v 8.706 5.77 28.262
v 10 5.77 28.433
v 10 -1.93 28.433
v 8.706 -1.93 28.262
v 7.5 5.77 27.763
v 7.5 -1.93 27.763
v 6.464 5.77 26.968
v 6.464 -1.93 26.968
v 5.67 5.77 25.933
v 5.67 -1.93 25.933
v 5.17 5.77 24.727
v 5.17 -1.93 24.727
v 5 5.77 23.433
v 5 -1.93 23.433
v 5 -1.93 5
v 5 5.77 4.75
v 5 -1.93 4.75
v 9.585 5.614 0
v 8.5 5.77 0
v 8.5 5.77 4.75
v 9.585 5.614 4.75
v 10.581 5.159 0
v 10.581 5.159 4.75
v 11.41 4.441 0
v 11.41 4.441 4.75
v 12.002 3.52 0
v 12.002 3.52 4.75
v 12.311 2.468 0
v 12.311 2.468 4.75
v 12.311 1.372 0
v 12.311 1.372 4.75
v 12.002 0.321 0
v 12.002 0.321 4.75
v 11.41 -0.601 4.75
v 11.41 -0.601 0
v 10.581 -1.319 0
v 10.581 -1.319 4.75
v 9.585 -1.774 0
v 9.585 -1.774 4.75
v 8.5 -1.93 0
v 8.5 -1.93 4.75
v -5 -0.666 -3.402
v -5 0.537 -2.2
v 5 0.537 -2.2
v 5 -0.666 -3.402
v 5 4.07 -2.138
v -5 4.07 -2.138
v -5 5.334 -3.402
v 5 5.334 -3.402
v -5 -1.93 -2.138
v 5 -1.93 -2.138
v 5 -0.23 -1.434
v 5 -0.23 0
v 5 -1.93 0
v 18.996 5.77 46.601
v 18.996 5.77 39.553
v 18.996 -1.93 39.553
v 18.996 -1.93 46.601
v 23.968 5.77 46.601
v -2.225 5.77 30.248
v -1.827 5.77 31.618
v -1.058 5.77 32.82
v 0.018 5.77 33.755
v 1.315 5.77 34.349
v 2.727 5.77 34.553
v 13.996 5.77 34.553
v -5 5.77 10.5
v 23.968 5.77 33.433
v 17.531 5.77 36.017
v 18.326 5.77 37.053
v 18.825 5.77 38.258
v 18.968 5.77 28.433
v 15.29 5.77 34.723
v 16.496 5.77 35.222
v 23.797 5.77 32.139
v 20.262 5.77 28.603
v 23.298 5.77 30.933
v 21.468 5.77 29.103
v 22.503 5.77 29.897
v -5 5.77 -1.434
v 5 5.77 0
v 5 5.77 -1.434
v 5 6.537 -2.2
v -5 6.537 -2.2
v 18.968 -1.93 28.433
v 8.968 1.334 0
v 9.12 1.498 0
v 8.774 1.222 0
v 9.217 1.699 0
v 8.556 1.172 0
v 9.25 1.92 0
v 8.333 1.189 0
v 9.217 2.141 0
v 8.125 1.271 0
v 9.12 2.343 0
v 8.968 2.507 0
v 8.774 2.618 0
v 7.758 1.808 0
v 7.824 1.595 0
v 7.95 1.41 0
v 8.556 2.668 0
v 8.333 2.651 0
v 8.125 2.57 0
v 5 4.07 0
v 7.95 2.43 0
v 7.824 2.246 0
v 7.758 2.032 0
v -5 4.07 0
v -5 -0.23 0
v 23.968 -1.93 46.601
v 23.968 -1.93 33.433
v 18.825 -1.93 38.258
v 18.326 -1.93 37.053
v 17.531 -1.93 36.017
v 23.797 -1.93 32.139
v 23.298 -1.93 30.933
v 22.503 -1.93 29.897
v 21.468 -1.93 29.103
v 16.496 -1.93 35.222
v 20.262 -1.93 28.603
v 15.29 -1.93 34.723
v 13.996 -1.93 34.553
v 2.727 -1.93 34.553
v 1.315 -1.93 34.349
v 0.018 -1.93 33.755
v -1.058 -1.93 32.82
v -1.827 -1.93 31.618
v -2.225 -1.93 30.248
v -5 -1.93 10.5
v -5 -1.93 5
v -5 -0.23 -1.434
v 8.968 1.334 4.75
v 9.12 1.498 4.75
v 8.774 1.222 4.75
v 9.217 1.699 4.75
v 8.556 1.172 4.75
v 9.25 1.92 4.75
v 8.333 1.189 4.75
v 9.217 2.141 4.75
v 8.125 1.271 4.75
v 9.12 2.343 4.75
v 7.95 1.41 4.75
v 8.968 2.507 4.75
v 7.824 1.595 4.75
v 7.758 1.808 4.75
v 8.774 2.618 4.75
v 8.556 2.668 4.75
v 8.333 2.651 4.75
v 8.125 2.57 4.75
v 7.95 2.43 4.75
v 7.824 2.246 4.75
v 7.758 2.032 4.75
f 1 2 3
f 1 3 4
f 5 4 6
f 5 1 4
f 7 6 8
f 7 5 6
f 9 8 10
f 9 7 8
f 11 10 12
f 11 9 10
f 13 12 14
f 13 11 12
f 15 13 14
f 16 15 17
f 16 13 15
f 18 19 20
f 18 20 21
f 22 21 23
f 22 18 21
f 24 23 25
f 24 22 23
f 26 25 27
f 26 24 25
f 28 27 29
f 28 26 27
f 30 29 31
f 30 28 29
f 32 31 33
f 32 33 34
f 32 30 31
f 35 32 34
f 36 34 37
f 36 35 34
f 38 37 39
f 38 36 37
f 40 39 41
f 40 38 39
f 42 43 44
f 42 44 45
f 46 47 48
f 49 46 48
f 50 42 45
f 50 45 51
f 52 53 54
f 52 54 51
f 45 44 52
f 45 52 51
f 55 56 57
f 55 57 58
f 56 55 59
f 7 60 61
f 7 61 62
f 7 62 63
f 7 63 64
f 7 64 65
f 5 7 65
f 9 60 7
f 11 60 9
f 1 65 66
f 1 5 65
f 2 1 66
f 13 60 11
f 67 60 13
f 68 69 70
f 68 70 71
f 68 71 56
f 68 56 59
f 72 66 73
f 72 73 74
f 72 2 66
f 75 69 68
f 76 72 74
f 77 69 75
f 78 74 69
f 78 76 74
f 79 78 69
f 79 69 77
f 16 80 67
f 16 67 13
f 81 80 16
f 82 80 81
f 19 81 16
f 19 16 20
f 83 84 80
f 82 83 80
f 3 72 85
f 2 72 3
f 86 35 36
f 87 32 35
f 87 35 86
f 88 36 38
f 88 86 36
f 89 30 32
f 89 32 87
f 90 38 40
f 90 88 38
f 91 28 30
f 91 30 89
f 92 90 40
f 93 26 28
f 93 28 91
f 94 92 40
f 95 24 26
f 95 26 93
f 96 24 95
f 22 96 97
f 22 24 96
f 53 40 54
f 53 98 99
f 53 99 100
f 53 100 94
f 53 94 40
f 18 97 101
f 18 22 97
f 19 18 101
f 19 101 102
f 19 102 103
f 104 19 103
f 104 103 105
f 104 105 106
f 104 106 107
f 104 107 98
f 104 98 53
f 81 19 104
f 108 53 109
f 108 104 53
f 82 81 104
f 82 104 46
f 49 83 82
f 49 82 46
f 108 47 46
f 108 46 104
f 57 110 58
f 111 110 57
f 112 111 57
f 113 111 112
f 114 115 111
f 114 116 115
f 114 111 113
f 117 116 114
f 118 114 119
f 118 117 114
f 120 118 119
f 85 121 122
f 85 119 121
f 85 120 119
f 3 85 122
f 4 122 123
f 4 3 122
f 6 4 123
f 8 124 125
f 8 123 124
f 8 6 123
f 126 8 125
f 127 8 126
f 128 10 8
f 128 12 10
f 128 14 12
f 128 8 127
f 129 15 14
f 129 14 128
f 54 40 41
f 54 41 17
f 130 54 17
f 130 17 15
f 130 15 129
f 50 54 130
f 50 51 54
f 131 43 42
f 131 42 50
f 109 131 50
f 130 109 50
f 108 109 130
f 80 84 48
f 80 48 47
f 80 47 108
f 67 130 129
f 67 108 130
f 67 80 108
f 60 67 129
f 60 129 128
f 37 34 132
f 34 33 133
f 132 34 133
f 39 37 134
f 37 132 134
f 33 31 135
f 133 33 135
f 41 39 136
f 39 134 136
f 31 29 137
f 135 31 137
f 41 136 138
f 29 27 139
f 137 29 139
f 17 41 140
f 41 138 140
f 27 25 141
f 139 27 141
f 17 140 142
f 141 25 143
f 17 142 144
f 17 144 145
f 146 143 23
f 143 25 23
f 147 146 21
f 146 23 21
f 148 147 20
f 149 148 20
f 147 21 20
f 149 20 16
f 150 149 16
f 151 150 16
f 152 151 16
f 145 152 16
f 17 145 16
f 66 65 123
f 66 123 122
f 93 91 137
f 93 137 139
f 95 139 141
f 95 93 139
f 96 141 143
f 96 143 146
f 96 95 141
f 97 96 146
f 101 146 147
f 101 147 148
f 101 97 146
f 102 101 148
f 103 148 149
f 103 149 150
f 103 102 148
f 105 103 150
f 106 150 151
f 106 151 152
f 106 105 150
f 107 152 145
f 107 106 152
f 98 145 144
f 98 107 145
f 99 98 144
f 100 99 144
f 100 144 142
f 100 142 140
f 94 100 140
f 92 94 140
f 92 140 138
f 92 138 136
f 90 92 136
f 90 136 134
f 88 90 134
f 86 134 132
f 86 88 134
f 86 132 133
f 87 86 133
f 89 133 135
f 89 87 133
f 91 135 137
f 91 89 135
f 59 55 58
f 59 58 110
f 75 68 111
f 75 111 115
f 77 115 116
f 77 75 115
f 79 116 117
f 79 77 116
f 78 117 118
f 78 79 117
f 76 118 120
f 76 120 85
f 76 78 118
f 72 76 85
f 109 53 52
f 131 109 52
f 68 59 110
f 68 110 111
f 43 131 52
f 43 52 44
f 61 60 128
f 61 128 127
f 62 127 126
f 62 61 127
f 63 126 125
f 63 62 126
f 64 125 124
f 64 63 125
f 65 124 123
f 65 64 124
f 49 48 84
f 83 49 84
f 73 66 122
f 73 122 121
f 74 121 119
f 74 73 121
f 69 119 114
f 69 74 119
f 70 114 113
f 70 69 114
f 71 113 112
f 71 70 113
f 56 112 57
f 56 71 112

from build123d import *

# Parameters (mm, degrees)
SKETCH2_W           = 10
SKETCH2_H           = 14.768412439
BOSS_EXTRUDE1_DEPTH = 5
BOSS_EXTRUDE4_DEPTH = 10
SKETCH9_W           = 10
SKETCH9_H           = 3.18
SKETCH9_H_2         = 3.888412439
CUT_EXTRUDE3_DEPTH  = 5
BOSS_EXTRUDE5_DEPTH = 7.7
SKETCH12_R          = 0.75
BOSS_EXTRUDE7_DEPTH = 4.75


with BuildPart() as part:
    # Sketch2 → Boss-Extrude1 (new body)
    with BuildSketch(Plane.XY):
        with Locations((0, 1.566049366)):
            Rectangle(SKETCH2_W, SKETCH2_H)
    extrude(amount=BOSS_EXTRUDE1_DEPTH)

    # Sketch8 → Boss-Extrude4 (add)
    with BuildSketch(Plane.ZY.offset(5)):
        Polygon((-0.15, 5.770255585), (0, 5.770255585), (0, 4.070255585), (-0.15, 4.070255585), (-2.137867966, 4.070255585), (-3.402081528, 5.334469147), (-2.2, 6.536550675), (-1.43370491, 5.770255585), align=None)
        Polygon((-0.15, -1.929744415), (0, -1.929744415), (0, -0.229744415), (-0.15, -0.229744415), (-1.43370491, -0.229744415), (-2.2, 0.536550675), (-3.402081528, -0.665530853), (-2.137867966, -1.929744415), align=None)
    extrude(amount=-BOSS_EXTRUDE4_DEPTH)

    # Sketch9 → Cut-Extrude3 (cut)
    with BuildSketch(Plane(origin=(0, 0, 0), x_dir=(-1, 0, 0), z_dir=(0, 0, -1))):
        with Locations((0, 7.360255585)):
            Rectangle(SKETCH9_W, SKETCH9_H)
        with Locations((0, -3.873950635)):
            Rectangle(SKETCH9_W, SKETCH9_H_2)
    extrude(amount=-CUT_EXTRUDE3_DEPTH, mode=Mode.SUBTRACT)

    # Sketch10 → Boss-Extrude5 (add)
    with BuildSketch(Plane(origin=(0, 5.770255585, 0), x_dir=(1, 0, 0), z_dir=(0, 1, 0))):
        with BuildLine():
            Line((-5, -5), (-5, -10.5))
            Line((-5, -10.5), (-2.224545314, -30.248386236))
            ThreePointArc((-2.224545314, -30.248386236), (-0.553500116, -33.326068633), (2.726795029, -34.552520732))
            Line((2.726795029, -34.552520732), (13.995577548, -34.552520732))
            ThreePointArc((13.995577548, -34.552520732), (17.531111453, -36.016986826), (18.995577548, -39.552520732))
            Line((18.995577548, -39.552520732), (18.995577548, -46.600725687))
            Line((18.995577548, -46.600725687), (23.967852608, -46.600725687))
            Line((23.967852608, -46.600725687), (23.967852608, -33.43279758))
            ThreePointArc((23.967852608, -33.43279758), (22.503386514, -29.897263674), (18.967852608, -28.43279758))
            Line((18.967852608, -28.43279758), (10, -28.43279758))
            ThreePointArc((10, -28.43279758), (6.464466094, -26.968331486), (5, -23.43279758))
            Line((5, -23.43279758), (5, -14))
            Line((5, -14), (5, -5))
            Line((5, -5), (-5, -5))
        make_face()
    extrude(amount=-BOSS_EXTRUDE5_DEPTH)

    # Sketch12 → Boss-Extrude7 (add)
    with BuildSketch(Plane.XY):
        with BuildLine():
            Line((5, 5.770255585), (8.5, 5.770255585))
            ThreePointArc((8.5, 5.770255585), (12.35, 1.920255585), (8.5, -1.929744415))
            Line((8.5, -1.929744415), (5, -1.929744415))
            Line((5, -1.929744415), (5, 5.770255585))
        make_face()
        with Locations((8.5, 1.920255585)):
            Circle(SKETCH12_R, mode=Mode.SUBTRACT)
    extrude(amount=BOSS_EXTRUDE7_DEPTH)


solid = part.part
